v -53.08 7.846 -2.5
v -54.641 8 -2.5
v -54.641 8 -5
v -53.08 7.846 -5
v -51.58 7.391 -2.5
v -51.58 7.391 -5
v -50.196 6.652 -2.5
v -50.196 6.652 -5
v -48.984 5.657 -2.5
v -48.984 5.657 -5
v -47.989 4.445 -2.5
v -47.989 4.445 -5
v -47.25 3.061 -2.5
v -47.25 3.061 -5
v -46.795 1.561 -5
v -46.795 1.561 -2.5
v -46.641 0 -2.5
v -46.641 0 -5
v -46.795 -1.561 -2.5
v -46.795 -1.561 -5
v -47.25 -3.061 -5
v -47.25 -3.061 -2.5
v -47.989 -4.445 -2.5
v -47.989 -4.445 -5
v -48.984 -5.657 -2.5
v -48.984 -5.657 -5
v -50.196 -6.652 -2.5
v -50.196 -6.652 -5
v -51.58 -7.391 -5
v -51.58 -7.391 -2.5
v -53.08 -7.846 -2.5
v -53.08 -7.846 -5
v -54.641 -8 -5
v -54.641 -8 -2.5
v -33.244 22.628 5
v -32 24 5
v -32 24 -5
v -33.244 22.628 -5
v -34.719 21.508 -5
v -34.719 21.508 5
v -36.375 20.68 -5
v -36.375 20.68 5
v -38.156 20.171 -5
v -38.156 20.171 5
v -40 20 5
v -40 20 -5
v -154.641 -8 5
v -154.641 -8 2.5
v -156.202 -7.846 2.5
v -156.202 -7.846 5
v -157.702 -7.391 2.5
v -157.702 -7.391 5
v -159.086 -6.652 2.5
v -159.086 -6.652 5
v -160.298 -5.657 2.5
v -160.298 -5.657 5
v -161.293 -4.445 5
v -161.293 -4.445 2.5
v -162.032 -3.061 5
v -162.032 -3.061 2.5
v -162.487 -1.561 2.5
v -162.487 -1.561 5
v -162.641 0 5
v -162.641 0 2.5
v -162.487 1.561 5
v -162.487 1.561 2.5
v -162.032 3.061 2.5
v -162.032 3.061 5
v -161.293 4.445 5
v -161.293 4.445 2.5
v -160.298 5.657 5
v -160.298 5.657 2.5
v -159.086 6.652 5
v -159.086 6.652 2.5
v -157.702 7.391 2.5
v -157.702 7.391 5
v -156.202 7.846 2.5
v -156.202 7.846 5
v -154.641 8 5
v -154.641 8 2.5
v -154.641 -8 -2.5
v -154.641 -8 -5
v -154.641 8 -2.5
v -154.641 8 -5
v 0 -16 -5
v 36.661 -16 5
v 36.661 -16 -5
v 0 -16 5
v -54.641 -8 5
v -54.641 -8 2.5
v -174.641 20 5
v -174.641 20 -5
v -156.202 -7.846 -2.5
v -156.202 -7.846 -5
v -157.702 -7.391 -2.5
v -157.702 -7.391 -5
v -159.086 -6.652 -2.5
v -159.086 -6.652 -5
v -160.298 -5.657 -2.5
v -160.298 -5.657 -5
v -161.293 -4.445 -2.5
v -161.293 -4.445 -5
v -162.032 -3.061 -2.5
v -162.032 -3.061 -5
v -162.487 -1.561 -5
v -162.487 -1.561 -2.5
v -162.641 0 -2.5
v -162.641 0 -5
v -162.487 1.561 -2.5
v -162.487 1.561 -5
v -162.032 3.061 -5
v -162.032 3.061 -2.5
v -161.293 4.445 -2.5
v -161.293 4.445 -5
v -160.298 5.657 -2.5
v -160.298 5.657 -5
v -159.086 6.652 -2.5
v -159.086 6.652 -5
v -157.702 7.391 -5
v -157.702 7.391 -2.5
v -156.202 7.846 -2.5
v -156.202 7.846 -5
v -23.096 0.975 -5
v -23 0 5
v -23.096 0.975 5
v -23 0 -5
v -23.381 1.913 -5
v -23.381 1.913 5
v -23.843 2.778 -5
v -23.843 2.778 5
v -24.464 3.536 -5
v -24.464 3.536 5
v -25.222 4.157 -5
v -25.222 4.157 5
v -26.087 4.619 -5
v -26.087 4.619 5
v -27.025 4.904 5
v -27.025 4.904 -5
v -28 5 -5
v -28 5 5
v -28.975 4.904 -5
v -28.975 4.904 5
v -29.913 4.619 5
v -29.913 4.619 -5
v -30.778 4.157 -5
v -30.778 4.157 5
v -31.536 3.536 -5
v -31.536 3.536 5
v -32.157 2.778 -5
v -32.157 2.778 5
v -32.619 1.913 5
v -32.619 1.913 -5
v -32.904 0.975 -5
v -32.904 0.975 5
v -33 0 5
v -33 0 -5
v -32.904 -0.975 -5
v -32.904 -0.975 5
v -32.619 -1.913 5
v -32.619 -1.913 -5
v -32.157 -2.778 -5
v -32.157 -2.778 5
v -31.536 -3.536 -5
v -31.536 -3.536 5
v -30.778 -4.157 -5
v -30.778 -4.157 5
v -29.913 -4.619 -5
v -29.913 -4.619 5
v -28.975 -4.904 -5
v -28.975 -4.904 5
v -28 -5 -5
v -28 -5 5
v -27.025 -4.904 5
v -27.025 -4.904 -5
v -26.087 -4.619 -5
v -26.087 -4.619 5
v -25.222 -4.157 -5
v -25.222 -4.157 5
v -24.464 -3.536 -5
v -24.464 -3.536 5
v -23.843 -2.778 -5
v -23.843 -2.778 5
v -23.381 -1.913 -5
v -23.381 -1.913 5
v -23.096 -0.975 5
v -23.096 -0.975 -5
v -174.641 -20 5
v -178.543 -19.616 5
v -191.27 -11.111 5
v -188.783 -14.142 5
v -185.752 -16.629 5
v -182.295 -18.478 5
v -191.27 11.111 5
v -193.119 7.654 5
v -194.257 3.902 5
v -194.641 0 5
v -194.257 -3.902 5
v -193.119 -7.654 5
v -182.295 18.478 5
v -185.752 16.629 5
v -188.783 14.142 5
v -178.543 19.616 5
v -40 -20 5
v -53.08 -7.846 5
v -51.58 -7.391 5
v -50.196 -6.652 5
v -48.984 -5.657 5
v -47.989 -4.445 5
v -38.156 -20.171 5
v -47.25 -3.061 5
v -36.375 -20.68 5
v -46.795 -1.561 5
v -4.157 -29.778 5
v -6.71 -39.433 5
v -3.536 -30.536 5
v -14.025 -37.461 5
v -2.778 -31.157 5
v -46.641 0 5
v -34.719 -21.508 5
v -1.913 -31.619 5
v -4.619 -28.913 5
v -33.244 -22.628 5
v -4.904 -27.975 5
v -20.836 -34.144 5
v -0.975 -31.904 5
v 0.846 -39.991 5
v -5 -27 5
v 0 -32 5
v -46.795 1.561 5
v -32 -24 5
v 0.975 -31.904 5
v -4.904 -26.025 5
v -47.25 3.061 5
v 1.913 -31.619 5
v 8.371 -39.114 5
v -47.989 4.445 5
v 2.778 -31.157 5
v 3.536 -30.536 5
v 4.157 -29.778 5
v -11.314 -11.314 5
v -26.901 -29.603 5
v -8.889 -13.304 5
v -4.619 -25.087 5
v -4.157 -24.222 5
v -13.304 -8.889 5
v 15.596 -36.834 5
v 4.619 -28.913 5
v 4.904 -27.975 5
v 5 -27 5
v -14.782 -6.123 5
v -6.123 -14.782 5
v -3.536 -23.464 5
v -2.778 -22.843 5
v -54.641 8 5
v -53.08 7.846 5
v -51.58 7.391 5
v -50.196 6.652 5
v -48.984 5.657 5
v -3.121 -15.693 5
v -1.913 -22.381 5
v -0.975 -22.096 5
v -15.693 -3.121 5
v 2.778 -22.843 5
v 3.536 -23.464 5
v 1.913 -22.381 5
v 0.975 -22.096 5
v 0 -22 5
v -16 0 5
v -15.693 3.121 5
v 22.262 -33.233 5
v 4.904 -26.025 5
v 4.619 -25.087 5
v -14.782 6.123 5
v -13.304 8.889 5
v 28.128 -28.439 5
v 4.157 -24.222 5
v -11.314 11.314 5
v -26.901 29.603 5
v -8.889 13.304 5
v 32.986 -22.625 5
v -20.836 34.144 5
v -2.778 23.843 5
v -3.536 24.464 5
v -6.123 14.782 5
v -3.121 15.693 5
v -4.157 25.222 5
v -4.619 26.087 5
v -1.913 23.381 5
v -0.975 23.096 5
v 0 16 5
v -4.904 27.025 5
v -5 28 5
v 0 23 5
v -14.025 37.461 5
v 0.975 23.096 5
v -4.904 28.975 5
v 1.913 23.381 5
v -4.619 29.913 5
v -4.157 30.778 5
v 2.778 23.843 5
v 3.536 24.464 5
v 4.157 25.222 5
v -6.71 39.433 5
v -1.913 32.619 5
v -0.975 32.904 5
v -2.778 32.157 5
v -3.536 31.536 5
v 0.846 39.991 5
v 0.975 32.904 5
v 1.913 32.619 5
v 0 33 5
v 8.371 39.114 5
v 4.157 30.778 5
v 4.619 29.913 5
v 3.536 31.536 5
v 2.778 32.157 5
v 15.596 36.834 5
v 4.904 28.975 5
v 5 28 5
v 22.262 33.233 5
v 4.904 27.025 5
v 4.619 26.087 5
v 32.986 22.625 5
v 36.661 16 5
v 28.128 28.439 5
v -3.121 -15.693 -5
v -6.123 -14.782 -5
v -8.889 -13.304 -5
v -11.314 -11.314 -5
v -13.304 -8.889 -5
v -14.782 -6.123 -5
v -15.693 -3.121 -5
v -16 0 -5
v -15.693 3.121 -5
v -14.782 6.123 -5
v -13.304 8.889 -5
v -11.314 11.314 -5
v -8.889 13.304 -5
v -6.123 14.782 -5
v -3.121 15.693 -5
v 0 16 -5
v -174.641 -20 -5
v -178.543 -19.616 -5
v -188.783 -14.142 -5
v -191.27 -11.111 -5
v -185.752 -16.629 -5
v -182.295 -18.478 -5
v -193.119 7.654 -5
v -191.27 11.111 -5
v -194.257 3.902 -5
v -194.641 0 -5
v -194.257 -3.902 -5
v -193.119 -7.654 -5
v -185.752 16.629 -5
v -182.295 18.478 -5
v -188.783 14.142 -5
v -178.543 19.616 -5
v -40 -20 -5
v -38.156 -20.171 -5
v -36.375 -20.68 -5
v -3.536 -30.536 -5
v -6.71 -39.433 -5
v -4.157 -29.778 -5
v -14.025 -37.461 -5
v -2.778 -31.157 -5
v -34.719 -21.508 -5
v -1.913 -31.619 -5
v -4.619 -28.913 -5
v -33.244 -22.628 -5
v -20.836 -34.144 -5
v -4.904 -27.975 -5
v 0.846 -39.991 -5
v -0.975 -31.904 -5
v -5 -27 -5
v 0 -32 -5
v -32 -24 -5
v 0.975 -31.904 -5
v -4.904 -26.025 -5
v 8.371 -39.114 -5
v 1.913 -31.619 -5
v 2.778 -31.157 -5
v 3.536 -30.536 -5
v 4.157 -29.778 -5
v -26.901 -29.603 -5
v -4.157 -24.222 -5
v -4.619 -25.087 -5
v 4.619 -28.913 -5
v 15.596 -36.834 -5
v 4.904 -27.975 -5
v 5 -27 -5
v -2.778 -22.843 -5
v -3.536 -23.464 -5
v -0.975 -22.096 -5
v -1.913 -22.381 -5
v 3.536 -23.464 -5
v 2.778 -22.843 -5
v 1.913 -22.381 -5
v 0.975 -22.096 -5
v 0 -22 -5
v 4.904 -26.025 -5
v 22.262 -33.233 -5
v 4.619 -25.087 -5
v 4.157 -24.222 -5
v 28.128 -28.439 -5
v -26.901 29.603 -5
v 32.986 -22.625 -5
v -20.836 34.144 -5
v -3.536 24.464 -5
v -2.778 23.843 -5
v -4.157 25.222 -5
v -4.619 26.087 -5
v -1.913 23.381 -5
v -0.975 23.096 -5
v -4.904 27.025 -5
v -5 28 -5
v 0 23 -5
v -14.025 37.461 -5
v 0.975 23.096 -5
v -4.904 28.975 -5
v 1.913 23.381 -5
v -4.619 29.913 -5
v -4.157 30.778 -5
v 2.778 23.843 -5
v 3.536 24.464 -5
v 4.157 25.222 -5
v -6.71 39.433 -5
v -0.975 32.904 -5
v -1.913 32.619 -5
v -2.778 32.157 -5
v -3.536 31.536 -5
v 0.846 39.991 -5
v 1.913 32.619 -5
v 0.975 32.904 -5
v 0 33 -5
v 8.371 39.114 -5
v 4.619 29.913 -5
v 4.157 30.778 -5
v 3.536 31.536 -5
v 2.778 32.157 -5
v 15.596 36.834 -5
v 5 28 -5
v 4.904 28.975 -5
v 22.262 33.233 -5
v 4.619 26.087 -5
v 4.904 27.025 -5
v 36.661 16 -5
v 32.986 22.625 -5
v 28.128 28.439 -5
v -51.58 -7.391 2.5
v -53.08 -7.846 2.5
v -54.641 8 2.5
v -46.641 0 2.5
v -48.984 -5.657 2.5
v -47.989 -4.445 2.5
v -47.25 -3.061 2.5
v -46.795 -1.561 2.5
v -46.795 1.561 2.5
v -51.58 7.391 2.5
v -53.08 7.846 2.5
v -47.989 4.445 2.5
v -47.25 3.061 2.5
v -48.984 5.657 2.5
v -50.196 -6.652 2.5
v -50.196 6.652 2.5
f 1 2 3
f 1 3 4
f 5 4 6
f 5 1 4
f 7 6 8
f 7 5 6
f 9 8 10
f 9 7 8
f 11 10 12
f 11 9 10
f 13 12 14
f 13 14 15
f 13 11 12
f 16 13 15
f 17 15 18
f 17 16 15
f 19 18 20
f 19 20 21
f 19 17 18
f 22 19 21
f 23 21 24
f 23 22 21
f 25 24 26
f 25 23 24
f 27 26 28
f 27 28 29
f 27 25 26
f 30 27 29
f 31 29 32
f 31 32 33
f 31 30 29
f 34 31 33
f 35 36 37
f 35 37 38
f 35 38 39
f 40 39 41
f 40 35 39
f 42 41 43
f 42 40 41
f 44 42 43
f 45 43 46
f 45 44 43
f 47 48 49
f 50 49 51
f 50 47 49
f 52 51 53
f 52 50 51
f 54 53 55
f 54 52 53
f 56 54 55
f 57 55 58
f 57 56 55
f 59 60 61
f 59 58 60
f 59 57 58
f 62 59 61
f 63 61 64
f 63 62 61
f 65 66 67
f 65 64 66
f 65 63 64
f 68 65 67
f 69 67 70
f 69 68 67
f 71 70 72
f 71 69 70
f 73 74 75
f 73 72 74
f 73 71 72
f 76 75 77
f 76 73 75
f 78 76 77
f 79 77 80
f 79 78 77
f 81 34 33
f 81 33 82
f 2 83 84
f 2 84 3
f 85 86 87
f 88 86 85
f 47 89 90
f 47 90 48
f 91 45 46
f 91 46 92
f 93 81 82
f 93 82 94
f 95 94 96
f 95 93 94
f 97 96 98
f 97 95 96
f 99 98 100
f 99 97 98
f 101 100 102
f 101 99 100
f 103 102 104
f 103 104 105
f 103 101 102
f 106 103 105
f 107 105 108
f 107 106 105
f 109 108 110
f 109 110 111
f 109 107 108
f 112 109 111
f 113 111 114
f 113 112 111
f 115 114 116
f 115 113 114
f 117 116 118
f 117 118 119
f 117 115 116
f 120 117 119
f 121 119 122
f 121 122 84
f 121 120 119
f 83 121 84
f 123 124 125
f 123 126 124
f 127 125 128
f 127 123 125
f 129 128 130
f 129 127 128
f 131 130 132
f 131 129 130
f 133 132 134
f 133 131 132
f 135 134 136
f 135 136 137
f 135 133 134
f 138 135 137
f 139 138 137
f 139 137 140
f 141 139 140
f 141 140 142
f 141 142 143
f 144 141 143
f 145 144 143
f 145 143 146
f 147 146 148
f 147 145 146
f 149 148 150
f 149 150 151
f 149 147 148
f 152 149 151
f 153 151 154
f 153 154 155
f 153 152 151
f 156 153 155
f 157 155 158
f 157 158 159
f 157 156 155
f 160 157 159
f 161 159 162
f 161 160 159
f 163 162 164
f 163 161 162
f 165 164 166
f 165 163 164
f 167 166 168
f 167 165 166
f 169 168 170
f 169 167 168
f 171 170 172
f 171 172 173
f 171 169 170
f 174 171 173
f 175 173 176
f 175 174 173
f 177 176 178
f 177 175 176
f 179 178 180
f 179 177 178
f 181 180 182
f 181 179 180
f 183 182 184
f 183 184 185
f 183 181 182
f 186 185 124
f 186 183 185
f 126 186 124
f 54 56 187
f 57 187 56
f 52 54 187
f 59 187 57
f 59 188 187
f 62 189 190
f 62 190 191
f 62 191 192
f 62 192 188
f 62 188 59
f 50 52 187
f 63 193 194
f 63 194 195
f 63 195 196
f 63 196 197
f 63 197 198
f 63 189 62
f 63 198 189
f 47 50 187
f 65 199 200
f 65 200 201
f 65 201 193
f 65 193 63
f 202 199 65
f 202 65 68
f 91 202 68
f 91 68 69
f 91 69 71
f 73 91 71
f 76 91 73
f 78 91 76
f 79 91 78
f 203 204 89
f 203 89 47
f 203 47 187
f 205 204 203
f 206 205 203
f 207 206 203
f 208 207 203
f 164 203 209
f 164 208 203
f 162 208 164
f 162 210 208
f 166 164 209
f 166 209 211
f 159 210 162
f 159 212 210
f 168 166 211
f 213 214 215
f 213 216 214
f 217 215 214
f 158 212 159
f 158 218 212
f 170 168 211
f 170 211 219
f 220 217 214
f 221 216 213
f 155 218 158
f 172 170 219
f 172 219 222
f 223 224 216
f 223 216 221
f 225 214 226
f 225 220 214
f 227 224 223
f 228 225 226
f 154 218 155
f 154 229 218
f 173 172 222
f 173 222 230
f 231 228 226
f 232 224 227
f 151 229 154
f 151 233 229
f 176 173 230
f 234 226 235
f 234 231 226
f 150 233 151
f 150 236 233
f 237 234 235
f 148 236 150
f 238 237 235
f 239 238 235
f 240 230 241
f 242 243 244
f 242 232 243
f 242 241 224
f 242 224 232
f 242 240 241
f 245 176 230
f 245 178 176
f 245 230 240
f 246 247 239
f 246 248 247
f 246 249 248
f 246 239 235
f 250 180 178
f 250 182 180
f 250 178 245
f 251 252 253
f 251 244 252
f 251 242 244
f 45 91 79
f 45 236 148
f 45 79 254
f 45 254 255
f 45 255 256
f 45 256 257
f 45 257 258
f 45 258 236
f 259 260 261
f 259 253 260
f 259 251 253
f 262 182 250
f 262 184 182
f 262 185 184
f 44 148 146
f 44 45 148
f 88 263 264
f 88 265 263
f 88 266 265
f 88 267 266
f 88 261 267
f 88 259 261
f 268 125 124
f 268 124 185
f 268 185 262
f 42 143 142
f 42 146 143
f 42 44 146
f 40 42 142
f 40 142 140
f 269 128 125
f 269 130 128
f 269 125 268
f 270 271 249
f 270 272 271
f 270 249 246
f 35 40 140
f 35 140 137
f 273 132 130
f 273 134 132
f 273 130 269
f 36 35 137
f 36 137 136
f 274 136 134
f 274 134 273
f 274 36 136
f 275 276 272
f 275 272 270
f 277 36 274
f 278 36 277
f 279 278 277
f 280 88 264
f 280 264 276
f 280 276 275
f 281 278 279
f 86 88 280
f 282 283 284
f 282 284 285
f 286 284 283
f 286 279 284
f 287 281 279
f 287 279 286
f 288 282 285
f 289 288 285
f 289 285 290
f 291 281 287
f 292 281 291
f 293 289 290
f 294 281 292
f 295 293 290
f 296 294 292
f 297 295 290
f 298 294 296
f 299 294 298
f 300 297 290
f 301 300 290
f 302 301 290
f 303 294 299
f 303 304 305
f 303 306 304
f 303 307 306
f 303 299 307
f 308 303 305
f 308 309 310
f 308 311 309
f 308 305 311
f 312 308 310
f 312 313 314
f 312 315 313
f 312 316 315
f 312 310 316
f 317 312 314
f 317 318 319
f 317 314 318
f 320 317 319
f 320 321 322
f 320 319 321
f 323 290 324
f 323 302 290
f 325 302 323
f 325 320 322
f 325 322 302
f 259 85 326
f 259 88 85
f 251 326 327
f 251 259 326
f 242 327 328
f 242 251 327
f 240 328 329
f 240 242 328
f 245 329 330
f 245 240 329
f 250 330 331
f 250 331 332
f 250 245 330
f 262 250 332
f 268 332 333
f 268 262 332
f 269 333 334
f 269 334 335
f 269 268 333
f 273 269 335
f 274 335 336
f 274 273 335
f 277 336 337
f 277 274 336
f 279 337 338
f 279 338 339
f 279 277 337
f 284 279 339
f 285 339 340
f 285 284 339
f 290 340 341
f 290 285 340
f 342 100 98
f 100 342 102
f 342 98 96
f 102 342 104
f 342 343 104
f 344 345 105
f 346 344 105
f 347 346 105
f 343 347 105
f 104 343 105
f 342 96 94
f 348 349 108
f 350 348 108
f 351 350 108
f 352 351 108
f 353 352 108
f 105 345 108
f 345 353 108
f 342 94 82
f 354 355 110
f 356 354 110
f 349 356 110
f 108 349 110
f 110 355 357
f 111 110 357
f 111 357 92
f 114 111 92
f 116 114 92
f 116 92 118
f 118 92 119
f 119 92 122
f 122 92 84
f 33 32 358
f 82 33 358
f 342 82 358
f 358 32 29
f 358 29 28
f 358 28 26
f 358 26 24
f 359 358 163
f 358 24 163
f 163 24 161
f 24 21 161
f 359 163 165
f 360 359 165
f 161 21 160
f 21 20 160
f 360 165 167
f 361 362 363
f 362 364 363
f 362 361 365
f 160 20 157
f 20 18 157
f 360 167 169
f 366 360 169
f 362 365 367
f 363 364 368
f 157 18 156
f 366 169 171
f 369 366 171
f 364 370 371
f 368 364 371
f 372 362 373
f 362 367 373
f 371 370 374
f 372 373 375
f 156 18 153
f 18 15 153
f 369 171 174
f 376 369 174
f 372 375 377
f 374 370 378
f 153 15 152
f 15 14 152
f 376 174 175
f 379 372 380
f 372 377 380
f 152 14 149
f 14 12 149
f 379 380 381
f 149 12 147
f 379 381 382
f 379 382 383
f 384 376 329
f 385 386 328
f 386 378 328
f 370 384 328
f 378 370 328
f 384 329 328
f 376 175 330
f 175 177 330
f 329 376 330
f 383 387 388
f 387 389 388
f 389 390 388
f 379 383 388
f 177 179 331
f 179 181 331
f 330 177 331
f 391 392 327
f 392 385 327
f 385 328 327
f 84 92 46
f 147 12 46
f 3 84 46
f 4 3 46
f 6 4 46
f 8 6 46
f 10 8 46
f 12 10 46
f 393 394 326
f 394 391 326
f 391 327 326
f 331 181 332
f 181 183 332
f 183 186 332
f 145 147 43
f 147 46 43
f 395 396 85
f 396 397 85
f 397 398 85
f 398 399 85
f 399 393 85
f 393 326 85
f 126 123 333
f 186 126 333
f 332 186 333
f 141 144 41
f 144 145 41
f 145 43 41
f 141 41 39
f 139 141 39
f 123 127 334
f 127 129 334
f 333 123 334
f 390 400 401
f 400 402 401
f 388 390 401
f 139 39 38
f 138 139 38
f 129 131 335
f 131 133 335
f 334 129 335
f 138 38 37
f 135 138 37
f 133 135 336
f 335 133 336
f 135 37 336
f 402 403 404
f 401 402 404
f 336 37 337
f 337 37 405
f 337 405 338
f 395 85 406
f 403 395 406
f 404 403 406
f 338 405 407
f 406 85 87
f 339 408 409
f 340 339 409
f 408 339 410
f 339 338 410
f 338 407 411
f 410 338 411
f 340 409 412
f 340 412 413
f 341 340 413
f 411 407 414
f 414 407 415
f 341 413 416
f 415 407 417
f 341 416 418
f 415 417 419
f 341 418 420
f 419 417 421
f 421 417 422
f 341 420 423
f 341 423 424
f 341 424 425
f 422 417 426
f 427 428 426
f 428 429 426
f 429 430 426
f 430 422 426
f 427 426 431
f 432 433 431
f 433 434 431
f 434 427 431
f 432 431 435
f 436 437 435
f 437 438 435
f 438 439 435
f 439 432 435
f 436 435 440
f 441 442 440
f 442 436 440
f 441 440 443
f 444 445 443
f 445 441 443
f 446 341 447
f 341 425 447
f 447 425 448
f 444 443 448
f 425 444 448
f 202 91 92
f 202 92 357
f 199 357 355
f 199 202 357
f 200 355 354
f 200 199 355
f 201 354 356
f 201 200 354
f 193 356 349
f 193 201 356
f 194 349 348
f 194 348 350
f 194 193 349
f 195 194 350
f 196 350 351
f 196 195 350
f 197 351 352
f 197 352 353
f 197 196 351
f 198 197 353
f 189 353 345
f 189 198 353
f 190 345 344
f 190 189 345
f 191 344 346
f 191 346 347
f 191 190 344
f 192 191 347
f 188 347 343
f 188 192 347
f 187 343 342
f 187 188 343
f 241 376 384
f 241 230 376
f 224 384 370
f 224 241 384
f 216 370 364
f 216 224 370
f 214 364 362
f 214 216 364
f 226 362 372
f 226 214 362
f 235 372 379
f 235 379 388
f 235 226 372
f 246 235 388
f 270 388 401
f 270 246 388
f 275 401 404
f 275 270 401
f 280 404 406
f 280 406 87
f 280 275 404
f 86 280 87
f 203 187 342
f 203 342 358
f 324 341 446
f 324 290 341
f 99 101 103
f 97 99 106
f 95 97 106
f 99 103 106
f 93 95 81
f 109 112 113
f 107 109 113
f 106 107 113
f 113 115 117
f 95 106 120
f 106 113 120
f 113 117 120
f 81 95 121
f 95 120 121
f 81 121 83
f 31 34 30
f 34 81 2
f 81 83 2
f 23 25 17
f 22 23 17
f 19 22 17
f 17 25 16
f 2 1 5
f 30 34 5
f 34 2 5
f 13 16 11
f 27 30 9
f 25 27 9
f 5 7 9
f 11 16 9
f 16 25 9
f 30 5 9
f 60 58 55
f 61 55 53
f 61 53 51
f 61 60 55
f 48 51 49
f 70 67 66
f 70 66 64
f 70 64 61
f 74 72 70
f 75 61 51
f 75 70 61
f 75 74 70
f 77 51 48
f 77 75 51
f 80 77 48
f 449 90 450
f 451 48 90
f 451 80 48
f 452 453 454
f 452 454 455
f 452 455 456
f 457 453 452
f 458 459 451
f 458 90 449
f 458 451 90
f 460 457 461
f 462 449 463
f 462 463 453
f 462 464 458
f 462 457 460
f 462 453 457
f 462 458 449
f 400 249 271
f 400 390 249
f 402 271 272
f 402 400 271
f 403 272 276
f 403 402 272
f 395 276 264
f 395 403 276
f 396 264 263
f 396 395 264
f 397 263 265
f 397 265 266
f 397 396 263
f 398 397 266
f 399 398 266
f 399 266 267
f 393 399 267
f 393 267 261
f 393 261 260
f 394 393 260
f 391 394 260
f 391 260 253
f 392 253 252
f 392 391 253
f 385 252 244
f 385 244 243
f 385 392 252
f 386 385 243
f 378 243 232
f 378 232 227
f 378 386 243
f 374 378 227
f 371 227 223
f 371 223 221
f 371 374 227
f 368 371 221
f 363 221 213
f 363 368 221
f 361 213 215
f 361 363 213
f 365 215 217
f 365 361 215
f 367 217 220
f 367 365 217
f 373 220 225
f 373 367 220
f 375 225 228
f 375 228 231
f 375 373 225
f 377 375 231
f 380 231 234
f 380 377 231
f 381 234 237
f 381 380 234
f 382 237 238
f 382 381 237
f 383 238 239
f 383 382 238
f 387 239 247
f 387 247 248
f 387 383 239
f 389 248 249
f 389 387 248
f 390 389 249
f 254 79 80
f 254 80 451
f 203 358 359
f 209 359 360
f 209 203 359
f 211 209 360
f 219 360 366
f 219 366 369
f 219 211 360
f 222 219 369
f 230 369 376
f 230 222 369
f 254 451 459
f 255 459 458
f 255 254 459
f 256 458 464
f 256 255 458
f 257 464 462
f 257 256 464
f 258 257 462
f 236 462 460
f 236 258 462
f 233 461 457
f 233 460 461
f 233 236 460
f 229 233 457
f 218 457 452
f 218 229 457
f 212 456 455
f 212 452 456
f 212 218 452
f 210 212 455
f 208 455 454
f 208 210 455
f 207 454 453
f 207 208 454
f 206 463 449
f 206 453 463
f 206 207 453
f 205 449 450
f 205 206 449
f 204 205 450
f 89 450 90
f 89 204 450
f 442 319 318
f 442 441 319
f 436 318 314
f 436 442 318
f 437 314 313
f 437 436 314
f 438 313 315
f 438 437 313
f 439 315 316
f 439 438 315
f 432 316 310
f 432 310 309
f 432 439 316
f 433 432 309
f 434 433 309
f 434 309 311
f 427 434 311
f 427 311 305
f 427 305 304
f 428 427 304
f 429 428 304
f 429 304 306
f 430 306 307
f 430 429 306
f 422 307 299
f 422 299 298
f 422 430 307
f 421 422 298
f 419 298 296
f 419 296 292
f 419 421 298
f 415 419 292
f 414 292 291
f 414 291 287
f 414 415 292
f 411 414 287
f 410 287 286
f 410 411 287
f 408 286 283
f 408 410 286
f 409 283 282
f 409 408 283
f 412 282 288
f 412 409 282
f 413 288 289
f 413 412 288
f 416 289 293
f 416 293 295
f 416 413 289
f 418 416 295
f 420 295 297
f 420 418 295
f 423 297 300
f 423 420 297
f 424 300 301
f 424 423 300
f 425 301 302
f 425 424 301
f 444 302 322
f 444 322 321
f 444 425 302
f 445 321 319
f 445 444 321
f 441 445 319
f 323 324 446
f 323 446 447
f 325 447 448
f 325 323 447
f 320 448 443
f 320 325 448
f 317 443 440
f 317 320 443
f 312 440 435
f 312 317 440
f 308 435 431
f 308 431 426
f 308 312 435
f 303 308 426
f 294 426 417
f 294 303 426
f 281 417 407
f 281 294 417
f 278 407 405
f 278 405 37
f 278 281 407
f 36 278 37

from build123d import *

# Parameters (mm, degrees)
SKETCH1_R           = 5
BOSS_EXTRUDE1_DEPTH = 5
BOSS_EXTRUDE2_DEPTH = 2.5


with BuildPart() as part:
    # Sketch1 → Boss-Extrude1 (new, symmetric)
    with BuildSketch(Plane.XY):
        with BuildLine():
            Line((0, 16), (36.66060556, 16))
            ThreePointArc((36.66060556, 16), (4.629288395, 39.731218065), (-32, 24))
            ThreePointArc((-32, 24), (-35.527864045, 21.05572809), (-40, 20))
            Line((-40, 20), (-174.641016151, 20))
            ThreePointArc((-174.641016151, 20), (-194.641016151, 0), (-174.641016151, -20))
            Line((-174.641016151, -20), (-40, -20))
            ThreePointArc((-40, -20), (-35.527864045, -21.05572809), (-32, -24))
            ThreePointArc((-32, -24), (4.629288395, -39.731218065), (36.66060556, -16))
            Line((36.66060556, -16), (0, -16))
            ThreePointArc((0, -16), (-16, 0), (0, 16))
        make_face()
        with Locations((0, 28)):
            Circle(SKETCH1_R, mode=Mode.SUBTRACT)
        with Locations((0, -27)):
            Circle(SKETCH1_R, mode=Mode.SUBTRACT)
        with Locations((-28, 0)):
            Circle(SKETCH1_R, mode=Mode.SUBTRACT)
        with BuildLine():
            Line((-154.641016151, 8), (-54.641016151, 8))
            ThreePointArc((-54.641016151, 8), (-46.641016151, 0), (-54.641016151, -8))
            Line((-54.641016151, -8), (-154.641016151, -8))
            ThreePointArc((-154.641016151, -8), (-162.641016151, 0), (-154.641016151, 8))
        make_face(mode=Mode.SUBTRACT)
    extrude(amount=BOSS_EXTRUDE1_DEPTH, both=True)

    # Sketch1<2> → Boss-Extrude2 (add, symmetric)
    with BuildSketch(Plane.XY):
        with BuildLine():
            Line((-154.641016151, -8), (-54.641016151, -8))
            ThreePointArc((-54.641016151, -8), (-46.641016151, 0), (-54.641016151, 8))
            Line((-54.641016151, 8), (-154.641016151, 8))
            ThreePointArc((-154.641016151, 8), (-162.641016151, 0), (-154.641016151, -8))
        make_face()
    extrude(amount=BOSS_EXTRUDE2_DEPTH, both=True)


solid = part.part
